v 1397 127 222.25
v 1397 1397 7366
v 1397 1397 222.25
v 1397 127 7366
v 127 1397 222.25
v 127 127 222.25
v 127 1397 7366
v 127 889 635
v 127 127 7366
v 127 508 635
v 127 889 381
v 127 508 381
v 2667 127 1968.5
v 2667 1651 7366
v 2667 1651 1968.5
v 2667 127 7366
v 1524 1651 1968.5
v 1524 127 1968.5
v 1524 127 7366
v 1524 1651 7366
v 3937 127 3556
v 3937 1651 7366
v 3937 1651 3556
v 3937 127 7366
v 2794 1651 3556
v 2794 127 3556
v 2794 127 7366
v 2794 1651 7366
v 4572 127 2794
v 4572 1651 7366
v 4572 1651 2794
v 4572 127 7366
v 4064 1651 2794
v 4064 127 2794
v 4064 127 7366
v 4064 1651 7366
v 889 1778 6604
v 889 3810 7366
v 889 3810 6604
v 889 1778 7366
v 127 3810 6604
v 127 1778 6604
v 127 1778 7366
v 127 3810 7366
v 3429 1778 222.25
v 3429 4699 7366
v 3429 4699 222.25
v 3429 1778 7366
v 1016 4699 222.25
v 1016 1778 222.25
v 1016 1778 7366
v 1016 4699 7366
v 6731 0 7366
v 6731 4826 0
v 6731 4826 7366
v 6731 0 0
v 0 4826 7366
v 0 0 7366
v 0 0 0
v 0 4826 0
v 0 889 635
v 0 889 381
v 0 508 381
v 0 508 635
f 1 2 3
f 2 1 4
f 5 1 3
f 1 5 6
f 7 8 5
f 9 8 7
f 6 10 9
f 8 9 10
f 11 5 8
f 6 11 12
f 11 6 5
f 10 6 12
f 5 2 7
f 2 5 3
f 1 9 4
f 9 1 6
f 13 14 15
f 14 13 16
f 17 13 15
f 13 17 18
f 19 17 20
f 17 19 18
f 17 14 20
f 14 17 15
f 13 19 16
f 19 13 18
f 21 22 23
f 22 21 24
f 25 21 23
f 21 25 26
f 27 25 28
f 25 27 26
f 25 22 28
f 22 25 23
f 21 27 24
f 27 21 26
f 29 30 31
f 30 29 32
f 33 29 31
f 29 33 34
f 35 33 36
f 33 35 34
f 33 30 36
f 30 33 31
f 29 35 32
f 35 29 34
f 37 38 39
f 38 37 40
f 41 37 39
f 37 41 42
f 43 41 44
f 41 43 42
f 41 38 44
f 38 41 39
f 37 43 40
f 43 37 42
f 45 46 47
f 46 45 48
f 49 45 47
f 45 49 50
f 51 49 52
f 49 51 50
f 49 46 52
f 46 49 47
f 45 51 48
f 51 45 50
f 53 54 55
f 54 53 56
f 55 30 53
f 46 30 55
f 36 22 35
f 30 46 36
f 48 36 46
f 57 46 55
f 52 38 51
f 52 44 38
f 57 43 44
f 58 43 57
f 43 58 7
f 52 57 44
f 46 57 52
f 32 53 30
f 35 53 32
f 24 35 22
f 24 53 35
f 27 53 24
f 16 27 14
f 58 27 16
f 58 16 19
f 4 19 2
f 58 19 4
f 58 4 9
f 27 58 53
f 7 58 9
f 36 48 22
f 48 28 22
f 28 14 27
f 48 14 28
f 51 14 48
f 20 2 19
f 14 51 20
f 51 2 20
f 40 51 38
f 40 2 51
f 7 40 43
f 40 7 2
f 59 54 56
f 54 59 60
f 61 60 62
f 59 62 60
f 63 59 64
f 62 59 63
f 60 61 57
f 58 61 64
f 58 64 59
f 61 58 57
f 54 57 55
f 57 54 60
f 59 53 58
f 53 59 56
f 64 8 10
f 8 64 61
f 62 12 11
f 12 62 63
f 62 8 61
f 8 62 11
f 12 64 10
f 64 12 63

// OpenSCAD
// Tray 2 — Dental / Oral Care
// Units: 1/5 inch (0.2"). scale(5) → inches, scale(25.4) → mm.
// Footprint: 53u × 38u = 10.6" × 7.6", height: 58u (11.6")
//
// All items raised so tops sit flush at the rim.
// Toothbrush charger against left outer wall; USB-A hole pierces that wall.
//
// Layout:
//   y=1..12   toothbrush(10×10) │ toothpaste(9×12) │ night_toothpaste(9×12) │ tongue_scraper(4×12)
//   y=14..29  night_guard(6×16) │
//   y=14..36                    │ listerine(19×23)

floor_t  = 1;
cavity_h = 57;
tray_h   = cavity_h + floor_t;
wall     = 1;
chamfer  = 1.5;

raise_toothbrush       = cavity_h - 56.25;
raise_listerine        = cavity_h - 56.25;
raise_toothpaste       = cavity_h - 42.5;
raise_night_toothpaste = cavity_h - 30;
raise_tongue_scraper   = cavity_h - 36;
raise_night_guard      = cavity_h - 6;

// USB-A hole through left wall into toothbrush charger slot
// Charger slot: x=1..10, y=1..10. Hole centered in y at y=4..7, z at floor+2..floor+4
usb_w = 3;  // ~0.6" wide
usb_h = 2;  // ~0.4" tall

module slot(x, y, w, d, raise) {
    translate([x, y, floor_t + raise])
        cube([w, d, tray_h - floor_t - raise + 1]);
    if (chamfer > 0) {
        translate([x, y, tray_h - chamfer])
            rotate([-45, 0, 0])
                cube([w, chamfer * sqrt(2), chamfer * sqrt(2)]);
    }
}

W = 53; D = 38;

scale(25.4) scale(5) {
    difference() {
        cube([W, D, tray_h]);
        // Front row
        slot( 1,  1, 10, 10, raise_toothbrush);
        slot(12,  1,  9, 12, raise_toothpaste);
        slot(22,  1,  9, 12, raise_night_toothpaste);
        slot(32,  1,  4, 12, raise_tongue_scraper);
        // Back row
        slot( 1, 14,  6, 16, raise_night_guard);
        slot( 8, 14, 19, 23, raise_listerine);
        // USB-A cable hole through left outer wall
        translate([-0.5, 4, floor_t + 2])
            cube([wall + 1, usb_w, usb_h]);
    }
}
